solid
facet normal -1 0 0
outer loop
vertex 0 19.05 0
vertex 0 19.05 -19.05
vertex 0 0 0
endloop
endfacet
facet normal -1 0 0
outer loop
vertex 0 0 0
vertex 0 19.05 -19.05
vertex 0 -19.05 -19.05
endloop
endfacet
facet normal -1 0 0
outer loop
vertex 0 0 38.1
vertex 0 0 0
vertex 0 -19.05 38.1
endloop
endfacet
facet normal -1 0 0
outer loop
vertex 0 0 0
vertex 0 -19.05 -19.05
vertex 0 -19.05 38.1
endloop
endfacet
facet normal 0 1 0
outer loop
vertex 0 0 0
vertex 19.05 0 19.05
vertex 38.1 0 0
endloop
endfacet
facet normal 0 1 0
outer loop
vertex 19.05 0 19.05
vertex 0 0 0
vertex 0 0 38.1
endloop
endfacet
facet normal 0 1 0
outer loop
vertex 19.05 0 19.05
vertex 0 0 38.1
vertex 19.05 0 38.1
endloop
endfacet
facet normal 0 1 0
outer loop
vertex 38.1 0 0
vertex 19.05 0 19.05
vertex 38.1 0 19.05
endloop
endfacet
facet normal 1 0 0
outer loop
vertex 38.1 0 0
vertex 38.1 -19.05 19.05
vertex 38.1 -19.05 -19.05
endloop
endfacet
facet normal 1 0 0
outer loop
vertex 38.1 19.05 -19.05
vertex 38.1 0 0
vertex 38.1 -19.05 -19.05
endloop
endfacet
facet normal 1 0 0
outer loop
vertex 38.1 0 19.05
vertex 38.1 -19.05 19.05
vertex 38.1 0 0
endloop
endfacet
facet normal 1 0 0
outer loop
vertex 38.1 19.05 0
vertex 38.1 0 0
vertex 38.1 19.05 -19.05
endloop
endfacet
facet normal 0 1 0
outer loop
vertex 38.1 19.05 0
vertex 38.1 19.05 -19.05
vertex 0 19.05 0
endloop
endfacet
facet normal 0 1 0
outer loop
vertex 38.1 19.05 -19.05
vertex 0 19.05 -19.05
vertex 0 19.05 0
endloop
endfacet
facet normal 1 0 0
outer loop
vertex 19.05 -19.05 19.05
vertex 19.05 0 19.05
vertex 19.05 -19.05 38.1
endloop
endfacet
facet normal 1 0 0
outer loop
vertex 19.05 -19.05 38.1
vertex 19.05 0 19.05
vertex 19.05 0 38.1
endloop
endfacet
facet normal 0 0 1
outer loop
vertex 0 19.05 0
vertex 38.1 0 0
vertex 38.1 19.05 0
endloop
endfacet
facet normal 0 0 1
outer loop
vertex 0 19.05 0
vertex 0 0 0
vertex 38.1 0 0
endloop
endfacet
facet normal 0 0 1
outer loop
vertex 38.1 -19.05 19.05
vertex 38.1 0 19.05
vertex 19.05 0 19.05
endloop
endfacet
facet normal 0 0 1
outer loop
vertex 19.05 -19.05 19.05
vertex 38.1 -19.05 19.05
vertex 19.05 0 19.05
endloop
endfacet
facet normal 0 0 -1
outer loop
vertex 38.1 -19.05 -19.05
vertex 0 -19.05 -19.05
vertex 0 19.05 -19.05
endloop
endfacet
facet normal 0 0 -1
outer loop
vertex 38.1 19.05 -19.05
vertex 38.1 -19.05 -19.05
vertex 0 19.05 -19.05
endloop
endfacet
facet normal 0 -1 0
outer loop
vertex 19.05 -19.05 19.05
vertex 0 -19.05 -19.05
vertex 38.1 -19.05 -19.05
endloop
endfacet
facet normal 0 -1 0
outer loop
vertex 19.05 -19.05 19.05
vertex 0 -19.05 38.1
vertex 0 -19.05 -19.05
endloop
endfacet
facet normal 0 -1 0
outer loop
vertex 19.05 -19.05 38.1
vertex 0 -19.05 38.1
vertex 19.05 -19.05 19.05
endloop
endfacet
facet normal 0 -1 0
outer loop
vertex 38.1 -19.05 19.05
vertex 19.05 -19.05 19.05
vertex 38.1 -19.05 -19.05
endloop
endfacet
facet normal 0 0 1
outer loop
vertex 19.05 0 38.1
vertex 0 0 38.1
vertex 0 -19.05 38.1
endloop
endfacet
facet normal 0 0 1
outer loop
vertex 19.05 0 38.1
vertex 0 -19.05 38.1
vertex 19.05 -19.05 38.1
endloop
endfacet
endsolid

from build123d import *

# Parameters (mm, degrees)
F0_W      = 19.05
F0_H      = 19.05
F1_DEPTH  = 19.05
F2_W      = 19.05
F2_H      = 19.05
F3_DEPTH  = 19.05
F3_FACE_W = 19.05
F3_FACE_H = 19.05
F4_DEPTH  = 19.05


with BuildPart() as f1:
    # F0 (on Front) → F1 (new body)
    with BuildSketch(Plane.XZ):
        with Locations((9.525, 9.525)):
            Rectangle(F0_W, F0_H)
        with Locations((9.525, -9.525)):
            Rectangle(F0_W, F0_H)
        with Locations((28.575, -9.525)):
            Rectangle(F0_W, F0_H)
        with Locations((28.575, 9.525)):
            Rectangle(F0_W, F0_H)
        with Locations((9.525, 28.575)):
            Rectangle(F0_W, F0_H)
    extrude(amount=F1_DEPTH)

    # F2 (on Front) → F3 (join)
    with BuildSketch(Plane.XZ):
        with Locations((9.525, -9.525)):
            Rectangle(F2_W, F2_H)
    extrude(amount=-F3_DEPTH)

    # F3_face (on face) → F4 (join)
    with BuildSketch(Plane(origin=(19.05, 9.525, -9.525), x_dir=(0, 1, 0), z_dir=(1, 0, 0))):
        Rectangle(F3_FACE_W, F3_FACE_H)
    extrude(amount=F4_DEPTH)


solid = f1.part
